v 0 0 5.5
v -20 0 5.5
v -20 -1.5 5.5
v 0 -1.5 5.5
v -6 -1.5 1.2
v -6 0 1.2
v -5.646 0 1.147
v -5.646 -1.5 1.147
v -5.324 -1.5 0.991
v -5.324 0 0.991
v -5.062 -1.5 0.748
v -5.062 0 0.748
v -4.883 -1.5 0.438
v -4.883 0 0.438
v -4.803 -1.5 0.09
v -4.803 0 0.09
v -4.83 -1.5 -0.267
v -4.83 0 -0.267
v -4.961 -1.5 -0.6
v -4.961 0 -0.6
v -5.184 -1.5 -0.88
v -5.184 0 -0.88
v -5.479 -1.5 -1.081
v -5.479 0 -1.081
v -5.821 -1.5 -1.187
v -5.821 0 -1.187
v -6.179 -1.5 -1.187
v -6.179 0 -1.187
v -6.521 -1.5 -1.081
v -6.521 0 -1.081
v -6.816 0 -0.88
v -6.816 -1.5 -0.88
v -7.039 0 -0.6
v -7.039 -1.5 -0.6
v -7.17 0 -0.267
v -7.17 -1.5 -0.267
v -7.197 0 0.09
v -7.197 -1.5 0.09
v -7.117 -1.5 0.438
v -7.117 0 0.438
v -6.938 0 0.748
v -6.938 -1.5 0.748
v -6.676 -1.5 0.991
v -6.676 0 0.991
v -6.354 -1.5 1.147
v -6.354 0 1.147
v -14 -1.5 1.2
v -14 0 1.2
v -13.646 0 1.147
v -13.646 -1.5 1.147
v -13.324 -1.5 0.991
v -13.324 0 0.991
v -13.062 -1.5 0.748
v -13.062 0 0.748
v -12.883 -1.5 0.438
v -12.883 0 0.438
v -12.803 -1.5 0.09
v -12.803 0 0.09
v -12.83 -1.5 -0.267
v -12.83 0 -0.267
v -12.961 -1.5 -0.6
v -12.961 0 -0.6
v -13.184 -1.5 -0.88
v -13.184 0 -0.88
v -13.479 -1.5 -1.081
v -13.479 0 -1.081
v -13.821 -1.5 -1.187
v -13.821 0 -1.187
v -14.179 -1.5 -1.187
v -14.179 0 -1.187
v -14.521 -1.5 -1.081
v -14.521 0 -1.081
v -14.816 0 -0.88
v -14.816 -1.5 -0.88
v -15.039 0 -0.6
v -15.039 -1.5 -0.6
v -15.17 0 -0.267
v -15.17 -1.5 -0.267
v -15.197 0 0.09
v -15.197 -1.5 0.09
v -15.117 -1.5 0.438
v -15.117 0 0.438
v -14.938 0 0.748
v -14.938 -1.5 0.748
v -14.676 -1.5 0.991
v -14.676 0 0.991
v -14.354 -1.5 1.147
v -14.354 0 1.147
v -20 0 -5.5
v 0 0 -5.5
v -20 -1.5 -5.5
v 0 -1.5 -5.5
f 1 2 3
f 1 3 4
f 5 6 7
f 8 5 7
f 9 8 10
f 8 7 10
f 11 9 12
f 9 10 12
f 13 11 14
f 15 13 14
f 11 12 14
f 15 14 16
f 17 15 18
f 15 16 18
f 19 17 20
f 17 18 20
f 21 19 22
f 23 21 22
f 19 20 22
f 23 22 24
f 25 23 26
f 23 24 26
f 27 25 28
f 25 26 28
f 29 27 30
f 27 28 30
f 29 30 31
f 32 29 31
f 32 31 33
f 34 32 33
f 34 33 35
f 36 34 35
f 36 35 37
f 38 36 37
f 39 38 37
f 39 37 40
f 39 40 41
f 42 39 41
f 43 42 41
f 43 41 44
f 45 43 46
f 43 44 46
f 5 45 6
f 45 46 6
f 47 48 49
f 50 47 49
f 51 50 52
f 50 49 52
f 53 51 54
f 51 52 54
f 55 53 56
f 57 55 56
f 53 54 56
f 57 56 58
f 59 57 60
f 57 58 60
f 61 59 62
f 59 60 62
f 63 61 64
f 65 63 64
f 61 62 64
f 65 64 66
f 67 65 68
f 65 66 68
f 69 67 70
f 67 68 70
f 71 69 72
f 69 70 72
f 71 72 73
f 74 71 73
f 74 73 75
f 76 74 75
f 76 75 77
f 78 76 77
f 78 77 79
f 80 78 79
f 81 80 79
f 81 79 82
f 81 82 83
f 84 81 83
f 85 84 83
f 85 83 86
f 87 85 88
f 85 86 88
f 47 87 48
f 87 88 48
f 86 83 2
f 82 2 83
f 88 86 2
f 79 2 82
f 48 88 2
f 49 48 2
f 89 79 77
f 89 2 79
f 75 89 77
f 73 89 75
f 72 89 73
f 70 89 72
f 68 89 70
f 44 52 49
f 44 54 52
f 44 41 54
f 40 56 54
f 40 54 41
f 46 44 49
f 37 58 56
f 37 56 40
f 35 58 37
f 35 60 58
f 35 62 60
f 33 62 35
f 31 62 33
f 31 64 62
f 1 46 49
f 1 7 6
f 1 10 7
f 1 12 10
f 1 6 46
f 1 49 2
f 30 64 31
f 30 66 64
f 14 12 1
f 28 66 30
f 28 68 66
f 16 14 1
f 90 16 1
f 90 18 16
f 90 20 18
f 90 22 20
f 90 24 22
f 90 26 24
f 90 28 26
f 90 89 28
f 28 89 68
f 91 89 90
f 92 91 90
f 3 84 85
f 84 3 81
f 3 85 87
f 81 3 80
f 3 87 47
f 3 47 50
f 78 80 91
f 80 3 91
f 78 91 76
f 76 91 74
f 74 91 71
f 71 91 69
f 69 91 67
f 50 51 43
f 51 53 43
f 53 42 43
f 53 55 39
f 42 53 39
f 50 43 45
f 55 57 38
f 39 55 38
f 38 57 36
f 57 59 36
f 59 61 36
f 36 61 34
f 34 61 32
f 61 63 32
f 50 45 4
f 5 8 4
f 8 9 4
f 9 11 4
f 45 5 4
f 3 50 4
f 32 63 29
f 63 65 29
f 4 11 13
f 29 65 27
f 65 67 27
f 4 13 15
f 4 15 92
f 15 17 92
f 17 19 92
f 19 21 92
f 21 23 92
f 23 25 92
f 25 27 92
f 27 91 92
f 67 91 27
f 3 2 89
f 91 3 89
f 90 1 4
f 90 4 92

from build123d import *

# Parameters (mm, degrees)
SKETCH1_W           = 20
SKETCH1_H           = 11
BOSS_EXTRUDE1_DEPTH = 1.5
SKETCH2_R           = 1.2
CUT_EXTRUDE1_DEPTH  = 1.5


with BuildPart() as part:
    # Sketch1 → Boss-Extrude1 (new body)
    with BuildSketch(Plane(origin=(0, 0, 0), x_dir=(1, 0, 0), z_dir=(0, 1, 0))):
        with Locations((-10, 0)):
            Rectangle(SKETCH1_W, SKETCH1_H)
    extrude(amount=-BOSS_EXTRUDE1_DEPTH)

    # Sketch2 → Cut-Extrude1 (cut)
    with BuildSketch(Plane(origin=(0, 0, 0), x_dir=(1, 0, 0), z_dir=(0, 1, 0))):
        with Locations(Location((-6, 0, 0), (0, 0, 270))):
            Circle(SKETCH2_R)
        with Locations(Location((-14, 0, 0), (0, 0, 270))):
            Circle(SKETCH2_R)
    extrude(amount=-CUT_EXTRUDE1_DEPTH, mode=Mode.SUBTRACT)


solid = part.part
